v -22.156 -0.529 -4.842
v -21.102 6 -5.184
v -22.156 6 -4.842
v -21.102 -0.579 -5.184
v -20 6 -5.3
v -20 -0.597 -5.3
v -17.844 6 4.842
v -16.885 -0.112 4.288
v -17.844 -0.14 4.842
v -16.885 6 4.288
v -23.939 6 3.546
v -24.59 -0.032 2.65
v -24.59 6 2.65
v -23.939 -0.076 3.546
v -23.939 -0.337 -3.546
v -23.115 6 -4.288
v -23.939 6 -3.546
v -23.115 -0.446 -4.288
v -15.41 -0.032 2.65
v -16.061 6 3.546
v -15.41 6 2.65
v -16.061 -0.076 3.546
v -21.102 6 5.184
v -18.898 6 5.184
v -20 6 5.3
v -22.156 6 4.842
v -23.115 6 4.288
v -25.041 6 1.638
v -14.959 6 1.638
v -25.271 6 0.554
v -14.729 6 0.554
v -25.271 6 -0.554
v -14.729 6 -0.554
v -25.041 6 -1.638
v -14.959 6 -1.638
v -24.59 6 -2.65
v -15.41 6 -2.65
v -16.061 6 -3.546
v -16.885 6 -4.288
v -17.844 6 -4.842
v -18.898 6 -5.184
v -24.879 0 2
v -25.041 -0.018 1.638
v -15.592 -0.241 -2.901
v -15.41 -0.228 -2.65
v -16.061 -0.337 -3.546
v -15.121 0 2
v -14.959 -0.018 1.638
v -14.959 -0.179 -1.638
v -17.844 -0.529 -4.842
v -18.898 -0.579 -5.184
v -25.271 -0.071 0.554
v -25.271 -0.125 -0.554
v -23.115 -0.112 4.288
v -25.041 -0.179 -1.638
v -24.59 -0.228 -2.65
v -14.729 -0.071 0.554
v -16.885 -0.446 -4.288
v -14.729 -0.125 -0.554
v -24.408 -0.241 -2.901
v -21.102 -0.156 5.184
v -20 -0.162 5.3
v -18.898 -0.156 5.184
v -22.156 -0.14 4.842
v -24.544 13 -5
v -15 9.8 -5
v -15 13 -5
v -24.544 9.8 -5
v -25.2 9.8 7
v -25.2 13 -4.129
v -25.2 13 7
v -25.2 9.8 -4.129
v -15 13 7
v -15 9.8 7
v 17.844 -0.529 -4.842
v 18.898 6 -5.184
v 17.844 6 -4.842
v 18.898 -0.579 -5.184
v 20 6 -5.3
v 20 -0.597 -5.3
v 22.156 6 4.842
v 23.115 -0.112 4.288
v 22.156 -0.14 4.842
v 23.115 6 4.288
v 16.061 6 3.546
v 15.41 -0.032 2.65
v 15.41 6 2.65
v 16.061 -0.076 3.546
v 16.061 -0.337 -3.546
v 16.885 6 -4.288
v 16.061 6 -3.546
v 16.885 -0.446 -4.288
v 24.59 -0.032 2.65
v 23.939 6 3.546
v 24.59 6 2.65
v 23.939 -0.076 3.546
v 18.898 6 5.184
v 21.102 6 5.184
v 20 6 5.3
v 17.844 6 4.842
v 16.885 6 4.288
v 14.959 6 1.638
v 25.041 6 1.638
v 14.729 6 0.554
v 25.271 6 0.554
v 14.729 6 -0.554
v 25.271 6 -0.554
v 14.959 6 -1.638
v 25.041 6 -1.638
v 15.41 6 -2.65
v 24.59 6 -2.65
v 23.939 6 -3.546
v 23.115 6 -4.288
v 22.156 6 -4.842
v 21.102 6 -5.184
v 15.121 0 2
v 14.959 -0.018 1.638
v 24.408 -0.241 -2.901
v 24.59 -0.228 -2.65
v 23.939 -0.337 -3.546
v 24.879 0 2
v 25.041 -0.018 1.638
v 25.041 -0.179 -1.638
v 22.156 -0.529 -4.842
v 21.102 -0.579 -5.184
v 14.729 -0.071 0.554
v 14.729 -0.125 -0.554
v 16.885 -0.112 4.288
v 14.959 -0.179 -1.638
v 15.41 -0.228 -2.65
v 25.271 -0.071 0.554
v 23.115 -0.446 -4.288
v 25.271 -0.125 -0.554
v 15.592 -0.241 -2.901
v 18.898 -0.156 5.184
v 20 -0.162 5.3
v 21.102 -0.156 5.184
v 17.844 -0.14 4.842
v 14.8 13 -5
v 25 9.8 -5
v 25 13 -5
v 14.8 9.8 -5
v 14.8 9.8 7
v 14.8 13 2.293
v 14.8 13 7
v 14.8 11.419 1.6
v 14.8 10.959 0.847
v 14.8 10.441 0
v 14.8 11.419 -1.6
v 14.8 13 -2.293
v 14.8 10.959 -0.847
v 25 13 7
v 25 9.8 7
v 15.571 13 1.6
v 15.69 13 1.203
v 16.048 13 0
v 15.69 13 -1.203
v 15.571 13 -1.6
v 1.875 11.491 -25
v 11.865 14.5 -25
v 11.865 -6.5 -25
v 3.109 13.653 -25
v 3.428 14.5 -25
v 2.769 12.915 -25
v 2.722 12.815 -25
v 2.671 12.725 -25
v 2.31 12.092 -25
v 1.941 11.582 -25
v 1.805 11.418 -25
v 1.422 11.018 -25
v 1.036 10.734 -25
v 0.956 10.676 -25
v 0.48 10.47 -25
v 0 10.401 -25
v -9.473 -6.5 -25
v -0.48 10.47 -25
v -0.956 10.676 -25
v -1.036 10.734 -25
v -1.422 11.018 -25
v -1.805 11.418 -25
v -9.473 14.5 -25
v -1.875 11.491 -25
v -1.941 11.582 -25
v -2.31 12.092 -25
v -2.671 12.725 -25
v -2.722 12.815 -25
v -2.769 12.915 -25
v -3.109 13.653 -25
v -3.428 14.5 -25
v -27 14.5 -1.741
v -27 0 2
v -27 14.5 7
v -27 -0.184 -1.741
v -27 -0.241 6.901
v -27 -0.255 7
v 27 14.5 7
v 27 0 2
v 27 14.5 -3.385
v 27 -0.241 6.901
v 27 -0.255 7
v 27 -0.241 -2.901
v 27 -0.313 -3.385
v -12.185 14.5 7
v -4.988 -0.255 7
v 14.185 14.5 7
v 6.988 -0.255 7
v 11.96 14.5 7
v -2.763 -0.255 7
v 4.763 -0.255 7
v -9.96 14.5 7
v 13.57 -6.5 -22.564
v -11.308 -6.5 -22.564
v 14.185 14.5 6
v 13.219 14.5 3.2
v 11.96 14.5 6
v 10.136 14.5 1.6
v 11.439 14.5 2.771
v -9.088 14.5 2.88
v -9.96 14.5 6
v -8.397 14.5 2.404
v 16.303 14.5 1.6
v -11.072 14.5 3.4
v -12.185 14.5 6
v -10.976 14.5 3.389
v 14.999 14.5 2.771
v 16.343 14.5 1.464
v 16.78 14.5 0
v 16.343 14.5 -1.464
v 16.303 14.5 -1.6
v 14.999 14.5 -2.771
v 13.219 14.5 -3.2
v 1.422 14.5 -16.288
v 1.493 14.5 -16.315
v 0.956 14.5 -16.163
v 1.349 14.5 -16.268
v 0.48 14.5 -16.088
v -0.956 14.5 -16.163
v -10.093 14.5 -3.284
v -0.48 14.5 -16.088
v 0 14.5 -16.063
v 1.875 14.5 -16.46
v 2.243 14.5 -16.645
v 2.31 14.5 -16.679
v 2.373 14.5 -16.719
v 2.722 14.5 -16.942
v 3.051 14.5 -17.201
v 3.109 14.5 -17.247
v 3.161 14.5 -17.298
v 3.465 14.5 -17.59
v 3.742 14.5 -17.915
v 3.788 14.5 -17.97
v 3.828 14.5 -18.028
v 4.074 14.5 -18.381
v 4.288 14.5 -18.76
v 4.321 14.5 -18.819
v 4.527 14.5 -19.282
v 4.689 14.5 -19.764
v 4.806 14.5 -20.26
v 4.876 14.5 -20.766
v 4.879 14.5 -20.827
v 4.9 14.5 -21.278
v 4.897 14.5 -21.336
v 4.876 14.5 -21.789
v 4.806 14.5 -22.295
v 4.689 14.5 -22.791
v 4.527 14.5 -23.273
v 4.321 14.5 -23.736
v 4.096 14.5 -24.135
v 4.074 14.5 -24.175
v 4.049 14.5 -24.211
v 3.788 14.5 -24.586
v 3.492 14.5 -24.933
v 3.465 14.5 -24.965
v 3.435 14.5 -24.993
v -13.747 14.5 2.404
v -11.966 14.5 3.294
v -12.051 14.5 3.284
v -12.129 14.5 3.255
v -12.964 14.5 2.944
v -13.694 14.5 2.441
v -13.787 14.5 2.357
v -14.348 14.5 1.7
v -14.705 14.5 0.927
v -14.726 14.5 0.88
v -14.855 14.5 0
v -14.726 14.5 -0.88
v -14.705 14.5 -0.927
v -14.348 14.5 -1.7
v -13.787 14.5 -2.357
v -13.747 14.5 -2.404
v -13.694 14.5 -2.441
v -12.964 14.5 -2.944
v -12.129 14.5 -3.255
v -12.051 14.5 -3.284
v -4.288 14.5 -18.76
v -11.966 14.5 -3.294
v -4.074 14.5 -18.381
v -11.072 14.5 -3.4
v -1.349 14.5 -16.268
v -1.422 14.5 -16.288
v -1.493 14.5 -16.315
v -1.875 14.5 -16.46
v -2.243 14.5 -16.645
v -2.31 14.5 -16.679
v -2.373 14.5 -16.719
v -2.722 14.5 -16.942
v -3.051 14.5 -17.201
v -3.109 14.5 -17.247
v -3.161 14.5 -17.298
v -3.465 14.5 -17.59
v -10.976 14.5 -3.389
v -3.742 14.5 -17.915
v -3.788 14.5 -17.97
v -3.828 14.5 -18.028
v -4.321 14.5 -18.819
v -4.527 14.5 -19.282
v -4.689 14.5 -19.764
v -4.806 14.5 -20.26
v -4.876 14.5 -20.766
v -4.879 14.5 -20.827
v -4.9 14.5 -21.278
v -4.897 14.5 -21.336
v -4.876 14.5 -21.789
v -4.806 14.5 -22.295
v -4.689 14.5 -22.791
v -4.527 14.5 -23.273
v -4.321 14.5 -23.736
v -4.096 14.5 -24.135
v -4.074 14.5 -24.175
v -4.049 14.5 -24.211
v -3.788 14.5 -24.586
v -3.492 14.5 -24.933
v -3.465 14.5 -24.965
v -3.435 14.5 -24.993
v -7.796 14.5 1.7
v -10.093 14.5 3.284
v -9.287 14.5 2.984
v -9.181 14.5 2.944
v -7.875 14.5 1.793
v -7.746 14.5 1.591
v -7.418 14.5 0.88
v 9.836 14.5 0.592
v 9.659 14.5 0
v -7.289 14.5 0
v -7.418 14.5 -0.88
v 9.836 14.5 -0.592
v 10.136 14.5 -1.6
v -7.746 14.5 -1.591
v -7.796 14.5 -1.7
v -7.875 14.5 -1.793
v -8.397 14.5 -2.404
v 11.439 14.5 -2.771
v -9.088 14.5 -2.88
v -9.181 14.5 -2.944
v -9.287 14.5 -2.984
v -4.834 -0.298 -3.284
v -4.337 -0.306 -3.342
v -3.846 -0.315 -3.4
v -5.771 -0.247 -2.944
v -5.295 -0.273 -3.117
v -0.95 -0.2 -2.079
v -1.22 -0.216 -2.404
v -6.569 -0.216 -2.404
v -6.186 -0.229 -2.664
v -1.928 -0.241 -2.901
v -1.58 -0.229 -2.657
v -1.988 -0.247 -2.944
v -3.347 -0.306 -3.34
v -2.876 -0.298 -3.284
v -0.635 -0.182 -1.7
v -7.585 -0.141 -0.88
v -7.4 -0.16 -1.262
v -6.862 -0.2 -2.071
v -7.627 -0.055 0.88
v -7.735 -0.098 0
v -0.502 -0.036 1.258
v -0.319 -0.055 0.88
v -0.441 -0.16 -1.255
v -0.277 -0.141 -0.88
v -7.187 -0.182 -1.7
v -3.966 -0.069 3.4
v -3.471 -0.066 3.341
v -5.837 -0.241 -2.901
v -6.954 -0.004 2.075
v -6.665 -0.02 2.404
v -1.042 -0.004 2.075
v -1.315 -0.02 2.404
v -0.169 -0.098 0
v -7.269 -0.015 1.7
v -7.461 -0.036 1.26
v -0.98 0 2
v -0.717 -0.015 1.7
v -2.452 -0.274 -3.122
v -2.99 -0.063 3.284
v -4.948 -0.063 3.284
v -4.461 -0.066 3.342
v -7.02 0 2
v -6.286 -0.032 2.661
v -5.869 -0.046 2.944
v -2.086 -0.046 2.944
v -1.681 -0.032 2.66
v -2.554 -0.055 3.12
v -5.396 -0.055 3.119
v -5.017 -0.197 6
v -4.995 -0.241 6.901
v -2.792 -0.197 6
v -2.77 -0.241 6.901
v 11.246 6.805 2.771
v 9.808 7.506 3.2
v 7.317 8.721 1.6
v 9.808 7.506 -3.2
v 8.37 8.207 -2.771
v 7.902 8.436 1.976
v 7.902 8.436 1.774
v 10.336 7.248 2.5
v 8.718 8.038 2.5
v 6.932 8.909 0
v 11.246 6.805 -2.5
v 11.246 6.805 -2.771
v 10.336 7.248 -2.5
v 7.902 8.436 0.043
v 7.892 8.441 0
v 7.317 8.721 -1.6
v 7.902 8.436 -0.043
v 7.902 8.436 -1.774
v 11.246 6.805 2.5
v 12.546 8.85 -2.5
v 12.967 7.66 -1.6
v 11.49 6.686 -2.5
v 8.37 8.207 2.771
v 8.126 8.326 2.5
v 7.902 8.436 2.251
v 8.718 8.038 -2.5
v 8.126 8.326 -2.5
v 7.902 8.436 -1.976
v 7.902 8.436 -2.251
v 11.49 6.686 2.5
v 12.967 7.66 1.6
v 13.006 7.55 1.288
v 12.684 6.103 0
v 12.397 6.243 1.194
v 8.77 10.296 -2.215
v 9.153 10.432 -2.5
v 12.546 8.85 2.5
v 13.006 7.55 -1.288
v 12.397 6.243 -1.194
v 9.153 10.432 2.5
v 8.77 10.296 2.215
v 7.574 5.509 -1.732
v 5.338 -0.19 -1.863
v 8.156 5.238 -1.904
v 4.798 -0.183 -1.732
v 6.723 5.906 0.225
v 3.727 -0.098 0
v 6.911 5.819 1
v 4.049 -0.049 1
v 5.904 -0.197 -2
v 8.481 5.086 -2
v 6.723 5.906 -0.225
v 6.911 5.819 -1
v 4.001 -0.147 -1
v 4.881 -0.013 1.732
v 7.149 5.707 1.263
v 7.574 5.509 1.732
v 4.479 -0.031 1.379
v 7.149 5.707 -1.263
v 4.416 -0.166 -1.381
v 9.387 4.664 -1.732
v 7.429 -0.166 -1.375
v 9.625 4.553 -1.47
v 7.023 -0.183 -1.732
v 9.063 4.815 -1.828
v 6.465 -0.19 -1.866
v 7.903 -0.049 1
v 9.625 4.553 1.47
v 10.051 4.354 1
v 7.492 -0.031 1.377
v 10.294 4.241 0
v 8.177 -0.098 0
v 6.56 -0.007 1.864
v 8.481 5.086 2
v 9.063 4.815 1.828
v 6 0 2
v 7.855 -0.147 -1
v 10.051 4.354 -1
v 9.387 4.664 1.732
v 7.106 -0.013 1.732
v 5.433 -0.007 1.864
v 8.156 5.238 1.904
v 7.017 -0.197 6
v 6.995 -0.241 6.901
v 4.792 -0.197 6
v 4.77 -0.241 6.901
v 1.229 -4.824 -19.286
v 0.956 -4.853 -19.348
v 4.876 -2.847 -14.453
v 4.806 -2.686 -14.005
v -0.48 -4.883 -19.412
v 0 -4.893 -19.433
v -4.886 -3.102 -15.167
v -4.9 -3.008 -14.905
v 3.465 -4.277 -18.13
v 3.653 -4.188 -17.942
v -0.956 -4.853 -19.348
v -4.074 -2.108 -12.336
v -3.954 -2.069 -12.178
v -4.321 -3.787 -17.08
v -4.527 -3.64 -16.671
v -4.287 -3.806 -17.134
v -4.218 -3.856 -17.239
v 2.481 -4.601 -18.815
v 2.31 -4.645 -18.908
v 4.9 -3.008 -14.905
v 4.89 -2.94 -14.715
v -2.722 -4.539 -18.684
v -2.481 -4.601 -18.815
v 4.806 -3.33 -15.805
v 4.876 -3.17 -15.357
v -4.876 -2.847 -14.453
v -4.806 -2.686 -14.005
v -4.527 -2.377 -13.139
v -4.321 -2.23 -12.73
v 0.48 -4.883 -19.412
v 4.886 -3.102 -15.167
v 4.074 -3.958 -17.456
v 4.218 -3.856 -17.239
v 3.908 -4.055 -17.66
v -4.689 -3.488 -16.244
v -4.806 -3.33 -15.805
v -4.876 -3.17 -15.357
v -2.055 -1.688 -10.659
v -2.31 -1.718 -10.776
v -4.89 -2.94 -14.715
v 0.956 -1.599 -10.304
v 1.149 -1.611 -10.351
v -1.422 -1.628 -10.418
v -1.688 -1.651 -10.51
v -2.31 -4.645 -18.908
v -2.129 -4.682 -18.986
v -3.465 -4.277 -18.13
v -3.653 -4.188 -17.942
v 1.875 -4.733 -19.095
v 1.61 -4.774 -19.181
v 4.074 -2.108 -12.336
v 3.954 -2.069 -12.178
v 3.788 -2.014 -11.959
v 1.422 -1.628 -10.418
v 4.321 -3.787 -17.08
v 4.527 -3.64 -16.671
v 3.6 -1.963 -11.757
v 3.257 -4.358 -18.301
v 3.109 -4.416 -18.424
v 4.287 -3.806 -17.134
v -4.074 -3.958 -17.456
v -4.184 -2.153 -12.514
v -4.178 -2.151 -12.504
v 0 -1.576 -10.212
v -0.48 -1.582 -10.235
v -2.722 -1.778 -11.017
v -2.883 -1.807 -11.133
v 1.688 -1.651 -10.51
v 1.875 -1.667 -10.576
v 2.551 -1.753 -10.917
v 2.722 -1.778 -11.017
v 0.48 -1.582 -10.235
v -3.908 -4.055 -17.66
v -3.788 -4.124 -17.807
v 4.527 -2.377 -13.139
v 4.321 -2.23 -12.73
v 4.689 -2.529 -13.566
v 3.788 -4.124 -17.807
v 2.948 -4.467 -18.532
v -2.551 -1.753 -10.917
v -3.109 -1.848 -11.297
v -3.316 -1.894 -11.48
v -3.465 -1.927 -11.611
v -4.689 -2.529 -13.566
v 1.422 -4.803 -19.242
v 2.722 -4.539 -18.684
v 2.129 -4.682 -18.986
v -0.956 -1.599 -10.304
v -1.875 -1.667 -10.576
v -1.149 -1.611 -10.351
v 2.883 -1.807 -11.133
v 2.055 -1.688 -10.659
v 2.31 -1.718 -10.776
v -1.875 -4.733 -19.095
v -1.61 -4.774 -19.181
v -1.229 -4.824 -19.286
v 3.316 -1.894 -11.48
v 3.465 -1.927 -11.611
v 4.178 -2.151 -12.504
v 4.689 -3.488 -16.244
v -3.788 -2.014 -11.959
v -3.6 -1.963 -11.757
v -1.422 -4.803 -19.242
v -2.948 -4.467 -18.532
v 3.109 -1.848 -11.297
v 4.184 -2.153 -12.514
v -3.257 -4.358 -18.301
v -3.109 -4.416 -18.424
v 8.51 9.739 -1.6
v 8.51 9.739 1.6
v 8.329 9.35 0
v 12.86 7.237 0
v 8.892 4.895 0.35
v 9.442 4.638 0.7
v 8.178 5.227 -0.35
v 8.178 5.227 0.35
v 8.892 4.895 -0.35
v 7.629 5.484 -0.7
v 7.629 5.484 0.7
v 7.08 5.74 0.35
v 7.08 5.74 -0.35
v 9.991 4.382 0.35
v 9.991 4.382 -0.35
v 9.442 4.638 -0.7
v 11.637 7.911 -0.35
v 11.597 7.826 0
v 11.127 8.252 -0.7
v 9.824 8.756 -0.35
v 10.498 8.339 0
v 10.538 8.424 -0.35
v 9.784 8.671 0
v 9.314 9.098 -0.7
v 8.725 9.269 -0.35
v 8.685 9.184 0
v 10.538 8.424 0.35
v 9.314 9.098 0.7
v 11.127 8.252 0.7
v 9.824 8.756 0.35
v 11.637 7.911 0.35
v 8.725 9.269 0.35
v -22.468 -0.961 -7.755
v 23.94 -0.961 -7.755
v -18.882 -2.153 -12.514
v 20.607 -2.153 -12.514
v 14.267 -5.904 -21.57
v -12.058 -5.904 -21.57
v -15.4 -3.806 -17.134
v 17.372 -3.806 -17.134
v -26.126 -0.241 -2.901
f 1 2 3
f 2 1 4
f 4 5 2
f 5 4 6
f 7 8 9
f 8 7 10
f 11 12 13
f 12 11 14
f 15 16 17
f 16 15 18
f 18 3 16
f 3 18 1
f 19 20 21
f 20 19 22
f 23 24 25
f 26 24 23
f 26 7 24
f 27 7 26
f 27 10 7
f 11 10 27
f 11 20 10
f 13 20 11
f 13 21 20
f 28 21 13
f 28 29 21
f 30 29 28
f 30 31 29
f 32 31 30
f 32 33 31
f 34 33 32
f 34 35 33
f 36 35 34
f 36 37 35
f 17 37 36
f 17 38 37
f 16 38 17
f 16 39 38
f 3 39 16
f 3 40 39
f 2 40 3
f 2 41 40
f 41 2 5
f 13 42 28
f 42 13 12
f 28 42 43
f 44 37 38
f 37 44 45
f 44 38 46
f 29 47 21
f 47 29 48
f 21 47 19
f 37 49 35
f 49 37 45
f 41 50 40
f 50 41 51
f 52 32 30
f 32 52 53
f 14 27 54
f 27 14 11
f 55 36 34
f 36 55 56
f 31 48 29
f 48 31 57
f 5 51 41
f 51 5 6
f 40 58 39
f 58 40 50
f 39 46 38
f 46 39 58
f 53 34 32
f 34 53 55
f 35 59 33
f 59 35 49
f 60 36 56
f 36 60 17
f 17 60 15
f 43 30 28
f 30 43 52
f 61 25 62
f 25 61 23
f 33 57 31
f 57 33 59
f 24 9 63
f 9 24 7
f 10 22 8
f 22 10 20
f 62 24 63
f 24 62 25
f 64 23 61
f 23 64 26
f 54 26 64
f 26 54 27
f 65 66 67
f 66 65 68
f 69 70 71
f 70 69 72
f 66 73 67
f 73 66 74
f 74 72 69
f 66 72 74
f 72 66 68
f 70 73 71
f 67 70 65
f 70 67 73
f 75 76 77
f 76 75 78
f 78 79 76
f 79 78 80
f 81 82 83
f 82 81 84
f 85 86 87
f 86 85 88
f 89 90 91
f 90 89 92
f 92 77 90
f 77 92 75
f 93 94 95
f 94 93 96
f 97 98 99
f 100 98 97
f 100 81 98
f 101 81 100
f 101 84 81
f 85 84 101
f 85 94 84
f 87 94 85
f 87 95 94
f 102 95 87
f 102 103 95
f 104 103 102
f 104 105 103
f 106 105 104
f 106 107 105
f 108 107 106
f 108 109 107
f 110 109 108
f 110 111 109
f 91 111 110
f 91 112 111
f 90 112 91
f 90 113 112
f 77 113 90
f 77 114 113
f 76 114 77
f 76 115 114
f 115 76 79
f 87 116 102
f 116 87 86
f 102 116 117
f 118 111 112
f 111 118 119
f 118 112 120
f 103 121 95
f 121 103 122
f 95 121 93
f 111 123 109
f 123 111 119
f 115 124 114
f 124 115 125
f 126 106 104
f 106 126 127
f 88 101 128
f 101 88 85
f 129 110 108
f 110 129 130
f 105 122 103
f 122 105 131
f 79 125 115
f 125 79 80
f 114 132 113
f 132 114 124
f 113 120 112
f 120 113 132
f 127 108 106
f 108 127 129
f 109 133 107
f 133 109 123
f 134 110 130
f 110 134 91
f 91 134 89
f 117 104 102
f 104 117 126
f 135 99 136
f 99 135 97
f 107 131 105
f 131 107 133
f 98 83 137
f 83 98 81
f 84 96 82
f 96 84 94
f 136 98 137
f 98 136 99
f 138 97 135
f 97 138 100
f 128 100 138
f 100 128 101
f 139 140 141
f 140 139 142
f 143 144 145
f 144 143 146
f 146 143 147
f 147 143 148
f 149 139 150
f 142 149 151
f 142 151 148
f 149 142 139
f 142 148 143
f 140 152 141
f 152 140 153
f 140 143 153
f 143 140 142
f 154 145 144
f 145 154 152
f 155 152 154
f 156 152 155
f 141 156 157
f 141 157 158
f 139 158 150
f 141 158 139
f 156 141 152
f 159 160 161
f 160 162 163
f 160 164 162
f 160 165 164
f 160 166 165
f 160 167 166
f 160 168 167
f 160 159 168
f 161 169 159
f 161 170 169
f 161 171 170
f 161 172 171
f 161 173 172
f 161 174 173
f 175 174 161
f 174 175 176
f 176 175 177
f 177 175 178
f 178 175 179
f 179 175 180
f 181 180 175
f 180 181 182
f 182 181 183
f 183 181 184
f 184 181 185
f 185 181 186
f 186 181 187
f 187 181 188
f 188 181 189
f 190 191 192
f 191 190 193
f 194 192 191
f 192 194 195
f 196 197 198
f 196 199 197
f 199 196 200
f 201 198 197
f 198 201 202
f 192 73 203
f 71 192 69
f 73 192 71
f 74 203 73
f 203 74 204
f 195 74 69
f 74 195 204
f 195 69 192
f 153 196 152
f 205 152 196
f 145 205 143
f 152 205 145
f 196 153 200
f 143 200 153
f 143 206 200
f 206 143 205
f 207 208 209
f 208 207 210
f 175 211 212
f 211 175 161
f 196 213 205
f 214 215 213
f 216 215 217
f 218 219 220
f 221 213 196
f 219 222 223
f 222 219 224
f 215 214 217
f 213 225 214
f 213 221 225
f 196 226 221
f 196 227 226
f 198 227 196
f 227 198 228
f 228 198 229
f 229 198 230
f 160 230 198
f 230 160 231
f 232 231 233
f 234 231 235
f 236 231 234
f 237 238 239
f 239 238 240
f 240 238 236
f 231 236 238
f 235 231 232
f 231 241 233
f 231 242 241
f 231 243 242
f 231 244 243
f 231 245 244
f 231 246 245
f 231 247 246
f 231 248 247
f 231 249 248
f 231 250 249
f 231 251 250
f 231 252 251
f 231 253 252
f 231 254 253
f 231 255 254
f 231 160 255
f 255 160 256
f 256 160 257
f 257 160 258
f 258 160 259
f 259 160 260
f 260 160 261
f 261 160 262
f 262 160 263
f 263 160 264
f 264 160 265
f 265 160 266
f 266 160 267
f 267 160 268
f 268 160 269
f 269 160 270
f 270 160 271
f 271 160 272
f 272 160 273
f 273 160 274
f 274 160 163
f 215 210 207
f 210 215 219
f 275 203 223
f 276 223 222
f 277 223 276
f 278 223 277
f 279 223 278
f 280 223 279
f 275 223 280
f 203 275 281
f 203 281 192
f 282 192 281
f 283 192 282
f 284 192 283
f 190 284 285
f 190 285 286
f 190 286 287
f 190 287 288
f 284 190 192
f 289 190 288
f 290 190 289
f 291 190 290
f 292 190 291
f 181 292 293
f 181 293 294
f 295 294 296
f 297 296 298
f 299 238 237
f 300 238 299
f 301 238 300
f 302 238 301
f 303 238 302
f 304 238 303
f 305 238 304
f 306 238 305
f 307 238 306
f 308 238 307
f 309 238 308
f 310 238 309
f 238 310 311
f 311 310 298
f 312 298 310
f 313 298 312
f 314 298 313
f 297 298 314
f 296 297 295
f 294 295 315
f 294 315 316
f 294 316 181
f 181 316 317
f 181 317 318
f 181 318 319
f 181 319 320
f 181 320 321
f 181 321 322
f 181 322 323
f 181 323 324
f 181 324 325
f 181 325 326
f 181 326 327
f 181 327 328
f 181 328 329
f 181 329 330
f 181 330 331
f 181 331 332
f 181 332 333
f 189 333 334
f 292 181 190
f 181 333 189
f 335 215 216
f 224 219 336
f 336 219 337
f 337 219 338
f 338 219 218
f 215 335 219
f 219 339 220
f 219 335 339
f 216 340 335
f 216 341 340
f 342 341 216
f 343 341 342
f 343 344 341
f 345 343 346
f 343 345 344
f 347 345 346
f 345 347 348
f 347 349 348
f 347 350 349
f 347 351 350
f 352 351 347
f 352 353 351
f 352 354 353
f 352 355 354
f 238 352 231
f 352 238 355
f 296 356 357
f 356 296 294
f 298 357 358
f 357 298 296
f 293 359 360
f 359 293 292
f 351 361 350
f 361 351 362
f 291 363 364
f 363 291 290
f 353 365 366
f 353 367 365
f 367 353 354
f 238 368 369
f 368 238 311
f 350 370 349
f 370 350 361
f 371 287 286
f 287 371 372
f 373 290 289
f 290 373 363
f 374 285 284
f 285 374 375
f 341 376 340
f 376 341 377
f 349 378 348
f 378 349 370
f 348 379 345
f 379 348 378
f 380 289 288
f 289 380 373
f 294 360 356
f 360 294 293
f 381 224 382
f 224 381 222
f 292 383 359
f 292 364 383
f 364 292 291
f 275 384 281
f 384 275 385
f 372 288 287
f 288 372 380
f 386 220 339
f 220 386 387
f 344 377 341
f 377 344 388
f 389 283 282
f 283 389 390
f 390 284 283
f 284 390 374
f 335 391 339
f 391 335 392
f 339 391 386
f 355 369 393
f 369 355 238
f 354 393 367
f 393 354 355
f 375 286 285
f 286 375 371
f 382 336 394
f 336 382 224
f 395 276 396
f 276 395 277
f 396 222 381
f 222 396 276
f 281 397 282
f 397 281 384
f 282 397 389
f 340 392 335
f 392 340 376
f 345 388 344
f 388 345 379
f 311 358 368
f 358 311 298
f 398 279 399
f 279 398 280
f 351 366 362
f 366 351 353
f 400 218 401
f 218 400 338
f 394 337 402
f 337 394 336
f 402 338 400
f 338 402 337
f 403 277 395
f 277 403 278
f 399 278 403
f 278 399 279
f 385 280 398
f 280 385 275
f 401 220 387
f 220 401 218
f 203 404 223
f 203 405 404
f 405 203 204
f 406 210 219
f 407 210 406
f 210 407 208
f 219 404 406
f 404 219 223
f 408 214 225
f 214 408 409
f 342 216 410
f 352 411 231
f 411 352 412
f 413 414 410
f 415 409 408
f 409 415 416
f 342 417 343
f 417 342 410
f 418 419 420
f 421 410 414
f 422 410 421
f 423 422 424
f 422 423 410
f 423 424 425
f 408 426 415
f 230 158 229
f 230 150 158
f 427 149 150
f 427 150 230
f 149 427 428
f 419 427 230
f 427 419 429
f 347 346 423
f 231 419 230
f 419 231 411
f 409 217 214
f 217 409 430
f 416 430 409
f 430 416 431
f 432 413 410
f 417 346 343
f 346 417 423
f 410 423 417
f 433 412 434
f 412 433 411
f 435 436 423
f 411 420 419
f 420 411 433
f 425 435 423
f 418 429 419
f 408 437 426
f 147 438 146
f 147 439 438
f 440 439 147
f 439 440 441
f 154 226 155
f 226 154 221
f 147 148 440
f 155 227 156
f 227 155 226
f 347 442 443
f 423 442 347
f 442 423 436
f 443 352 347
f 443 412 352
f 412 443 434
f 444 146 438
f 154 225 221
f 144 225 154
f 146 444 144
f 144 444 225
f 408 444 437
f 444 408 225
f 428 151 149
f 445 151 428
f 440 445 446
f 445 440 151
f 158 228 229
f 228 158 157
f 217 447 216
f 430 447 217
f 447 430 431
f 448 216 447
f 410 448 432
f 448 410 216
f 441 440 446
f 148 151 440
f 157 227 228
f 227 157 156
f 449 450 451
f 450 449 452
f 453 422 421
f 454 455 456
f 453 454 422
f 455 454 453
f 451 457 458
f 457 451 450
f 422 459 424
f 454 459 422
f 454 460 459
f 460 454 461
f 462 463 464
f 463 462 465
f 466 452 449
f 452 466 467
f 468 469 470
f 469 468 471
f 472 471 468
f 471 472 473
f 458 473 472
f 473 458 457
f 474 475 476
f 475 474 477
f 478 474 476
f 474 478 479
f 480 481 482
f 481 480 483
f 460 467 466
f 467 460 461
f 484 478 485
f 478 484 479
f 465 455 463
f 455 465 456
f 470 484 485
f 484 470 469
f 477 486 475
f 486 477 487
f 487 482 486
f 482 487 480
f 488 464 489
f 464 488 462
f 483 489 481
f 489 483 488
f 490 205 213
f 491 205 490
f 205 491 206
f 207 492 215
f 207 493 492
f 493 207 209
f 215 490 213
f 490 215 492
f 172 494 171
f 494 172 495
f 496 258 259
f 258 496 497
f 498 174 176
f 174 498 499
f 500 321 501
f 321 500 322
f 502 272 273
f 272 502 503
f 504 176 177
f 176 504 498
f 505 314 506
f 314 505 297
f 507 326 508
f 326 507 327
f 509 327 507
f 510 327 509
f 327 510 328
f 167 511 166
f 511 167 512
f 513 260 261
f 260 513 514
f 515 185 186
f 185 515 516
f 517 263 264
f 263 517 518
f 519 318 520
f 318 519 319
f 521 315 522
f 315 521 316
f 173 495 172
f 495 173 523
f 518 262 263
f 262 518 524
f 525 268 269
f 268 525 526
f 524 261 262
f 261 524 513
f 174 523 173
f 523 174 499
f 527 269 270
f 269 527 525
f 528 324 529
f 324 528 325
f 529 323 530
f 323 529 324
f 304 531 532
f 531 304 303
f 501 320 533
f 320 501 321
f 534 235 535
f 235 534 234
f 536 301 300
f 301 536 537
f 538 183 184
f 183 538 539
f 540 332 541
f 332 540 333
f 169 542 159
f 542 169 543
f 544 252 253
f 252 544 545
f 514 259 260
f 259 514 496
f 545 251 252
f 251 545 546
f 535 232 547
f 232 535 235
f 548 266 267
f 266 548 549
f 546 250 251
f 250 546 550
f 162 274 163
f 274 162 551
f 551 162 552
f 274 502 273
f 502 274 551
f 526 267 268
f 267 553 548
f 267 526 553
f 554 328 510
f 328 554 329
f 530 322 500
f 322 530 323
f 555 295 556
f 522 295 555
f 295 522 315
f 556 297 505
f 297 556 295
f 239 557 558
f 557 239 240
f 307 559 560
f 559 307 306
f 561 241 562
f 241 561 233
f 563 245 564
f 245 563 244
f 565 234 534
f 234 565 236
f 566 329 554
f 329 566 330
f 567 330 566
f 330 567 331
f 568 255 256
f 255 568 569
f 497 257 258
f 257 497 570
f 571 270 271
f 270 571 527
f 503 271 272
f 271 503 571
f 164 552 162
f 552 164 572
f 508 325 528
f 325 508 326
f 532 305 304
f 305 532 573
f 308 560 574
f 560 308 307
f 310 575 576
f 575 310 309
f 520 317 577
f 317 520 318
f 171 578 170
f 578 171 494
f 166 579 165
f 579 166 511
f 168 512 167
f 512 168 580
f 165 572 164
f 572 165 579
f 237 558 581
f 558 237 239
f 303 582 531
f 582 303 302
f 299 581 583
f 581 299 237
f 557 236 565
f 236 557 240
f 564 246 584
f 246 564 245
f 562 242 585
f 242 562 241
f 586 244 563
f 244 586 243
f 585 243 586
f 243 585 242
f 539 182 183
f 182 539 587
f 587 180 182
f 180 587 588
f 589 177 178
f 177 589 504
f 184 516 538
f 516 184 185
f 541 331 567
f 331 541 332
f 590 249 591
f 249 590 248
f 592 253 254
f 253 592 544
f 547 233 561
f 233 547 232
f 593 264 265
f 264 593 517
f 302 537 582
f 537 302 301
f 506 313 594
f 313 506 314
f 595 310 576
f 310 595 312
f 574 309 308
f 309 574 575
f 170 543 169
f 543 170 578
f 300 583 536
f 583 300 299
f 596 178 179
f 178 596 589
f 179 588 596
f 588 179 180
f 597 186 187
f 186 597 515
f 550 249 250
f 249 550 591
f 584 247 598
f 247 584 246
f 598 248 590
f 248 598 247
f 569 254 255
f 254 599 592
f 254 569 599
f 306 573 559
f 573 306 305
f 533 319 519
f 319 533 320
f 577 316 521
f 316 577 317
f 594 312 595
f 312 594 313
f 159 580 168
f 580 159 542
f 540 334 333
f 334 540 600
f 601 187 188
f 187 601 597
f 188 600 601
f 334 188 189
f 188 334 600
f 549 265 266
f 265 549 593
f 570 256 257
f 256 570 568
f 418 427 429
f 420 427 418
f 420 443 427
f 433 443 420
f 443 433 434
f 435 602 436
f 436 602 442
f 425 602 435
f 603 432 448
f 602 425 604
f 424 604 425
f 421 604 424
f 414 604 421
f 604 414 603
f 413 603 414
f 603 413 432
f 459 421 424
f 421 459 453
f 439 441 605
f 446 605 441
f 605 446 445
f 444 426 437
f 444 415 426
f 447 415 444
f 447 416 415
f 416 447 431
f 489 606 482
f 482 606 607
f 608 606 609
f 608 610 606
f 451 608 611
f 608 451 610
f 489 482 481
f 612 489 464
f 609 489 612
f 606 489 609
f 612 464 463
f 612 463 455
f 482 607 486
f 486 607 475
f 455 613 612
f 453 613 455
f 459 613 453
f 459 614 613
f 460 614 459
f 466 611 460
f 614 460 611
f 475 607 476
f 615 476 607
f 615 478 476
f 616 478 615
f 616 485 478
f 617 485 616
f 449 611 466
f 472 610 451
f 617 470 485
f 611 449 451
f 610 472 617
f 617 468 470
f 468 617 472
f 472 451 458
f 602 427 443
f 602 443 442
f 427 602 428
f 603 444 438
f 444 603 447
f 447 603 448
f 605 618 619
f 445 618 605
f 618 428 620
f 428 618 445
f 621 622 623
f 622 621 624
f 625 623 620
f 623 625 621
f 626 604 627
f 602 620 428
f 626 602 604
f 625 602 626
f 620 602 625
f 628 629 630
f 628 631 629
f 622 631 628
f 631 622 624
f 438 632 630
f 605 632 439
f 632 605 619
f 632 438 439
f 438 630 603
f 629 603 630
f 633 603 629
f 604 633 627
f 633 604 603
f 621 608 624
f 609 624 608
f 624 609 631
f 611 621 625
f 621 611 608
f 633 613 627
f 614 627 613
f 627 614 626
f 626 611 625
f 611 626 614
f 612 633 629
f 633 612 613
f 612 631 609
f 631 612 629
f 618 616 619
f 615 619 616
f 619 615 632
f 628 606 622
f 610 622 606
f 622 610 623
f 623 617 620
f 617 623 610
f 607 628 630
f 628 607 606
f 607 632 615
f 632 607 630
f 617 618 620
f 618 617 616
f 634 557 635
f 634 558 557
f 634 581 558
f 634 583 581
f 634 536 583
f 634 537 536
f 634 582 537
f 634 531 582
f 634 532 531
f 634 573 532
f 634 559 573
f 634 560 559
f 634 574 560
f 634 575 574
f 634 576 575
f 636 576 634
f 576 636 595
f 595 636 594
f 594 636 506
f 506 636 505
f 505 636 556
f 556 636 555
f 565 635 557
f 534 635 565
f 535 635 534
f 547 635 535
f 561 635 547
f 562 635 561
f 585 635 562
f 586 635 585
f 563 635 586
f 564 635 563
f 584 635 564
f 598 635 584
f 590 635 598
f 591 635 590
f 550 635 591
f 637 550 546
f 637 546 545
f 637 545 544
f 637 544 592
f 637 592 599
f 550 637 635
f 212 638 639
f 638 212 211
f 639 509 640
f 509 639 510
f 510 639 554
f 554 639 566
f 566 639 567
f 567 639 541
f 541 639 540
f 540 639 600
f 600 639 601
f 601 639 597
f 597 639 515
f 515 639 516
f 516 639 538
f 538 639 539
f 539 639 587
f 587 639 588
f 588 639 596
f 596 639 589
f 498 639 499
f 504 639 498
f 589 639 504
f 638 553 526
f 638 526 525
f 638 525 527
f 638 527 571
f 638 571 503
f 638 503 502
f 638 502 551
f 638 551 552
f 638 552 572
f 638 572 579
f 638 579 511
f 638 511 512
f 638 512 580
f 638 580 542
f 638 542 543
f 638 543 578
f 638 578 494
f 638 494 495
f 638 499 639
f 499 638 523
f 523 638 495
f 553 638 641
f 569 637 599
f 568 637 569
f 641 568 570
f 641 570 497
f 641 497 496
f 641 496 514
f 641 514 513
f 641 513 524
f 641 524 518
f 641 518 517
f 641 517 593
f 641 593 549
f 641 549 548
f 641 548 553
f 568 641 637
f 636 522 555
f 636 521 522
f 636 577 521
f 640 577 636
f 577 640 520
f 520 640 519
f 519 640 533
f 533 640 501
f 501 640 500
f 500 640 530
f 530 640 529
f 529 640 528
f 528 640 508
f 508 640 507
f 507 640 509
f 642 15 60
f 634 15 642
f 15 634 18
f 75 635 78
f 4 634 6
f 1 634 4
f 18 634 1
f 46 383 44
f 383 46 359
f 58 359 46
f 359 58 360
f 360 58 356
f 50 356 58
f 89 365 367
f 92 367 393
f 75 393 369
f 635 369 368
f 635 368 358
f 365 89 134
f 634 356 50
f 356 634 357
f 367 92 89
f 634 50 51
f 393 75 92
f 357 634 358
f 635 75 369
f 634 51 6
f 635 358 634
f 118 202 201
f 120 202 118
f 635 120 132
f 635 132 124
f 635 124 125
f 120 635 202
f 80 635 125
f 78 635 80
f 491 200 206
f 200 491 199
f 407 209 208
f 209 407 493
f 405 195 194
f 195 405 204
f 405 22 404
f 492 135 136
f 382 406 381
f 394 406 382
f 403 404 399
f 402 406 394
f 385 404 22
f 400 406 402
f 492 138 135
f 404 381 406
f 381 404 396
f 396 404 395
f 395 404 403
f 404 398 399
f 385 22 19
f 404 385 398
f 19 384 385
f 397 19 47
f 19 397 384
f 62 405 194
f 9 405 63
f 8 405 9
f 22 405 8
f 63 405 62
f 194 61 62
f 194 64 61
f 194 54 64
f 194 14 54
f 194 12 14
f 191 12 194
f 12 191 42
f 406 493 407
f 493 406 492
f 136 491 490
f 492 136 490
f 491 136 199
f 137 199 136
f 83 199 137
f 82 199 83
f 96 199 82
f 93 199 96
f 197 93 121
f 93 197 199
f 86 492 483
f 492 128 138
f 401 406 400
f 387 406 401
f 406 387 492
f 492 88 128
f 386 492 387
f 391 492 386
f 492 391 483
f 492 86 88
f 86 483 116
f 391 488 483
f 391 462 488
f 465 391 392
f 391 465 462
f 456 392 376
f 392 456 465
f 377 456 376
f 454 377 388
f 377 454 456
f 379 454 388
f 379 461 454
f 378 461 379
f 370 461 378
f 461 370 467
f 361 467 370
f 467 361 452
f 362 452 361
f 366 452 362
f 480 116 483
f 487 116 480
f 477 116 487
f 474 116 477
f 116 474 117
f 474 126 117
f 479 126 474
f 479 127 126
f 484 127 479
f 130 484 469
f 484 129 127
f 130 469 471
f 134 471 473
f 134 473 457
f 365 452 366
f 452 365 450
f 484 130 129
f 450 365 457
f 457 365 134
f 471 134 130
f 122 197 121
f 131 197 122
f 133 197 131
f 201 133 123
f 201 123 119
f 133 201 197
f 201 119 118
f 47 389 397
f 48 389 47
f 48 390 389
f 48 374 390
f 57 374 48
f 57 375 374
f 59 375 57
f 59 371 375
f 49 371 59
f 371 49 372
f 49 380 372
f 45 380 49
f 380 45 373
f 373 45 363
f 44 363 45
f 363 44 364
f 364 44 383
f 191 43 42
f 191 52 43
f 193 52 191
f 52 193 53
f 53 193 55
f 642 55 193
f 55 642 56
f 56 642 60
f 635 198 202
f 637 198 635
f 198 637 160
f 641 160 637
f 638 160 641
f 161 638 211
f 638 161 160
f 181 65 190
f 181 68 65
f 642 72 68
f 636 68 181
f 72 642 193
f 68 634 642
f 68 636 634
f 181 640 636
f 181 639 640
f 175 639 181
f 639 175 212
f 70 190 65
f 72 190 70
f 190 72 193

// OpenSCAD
diameter=10;
height=4;
number=3;
distance=5;
baseline=36; 


module maghole(diameter,height,number,back) {
		translate([0,height*(number-2)/2,0])
        rotate([90,0,0])
         cylinder(r=diameter/2,h=height*(2*number-1),center=true);
    if(back == 1) {
		translate([0,-height*2*(number+1)/2,0])
        rotate([90,0,0])
         cylinder(r=diameter/6,h=height*number,center=true);
    }
}

module smaghole(diameter,height,number,back) {
		translate([0,(height*(number-2)/2),0])
        rotate([90,0,0])
         cylinder(r=0.3+diameter/2,h=height*4,center=true,$fs = 0.01);
//         cylinder(r=0.3+diameter/2,h=height*(2*number-1),center=true);

    translate([-9,-13,-5]) cube([4+diameter,3.2,diameter+0.2]);    
   // translate([-1,-15,0]) cube([3,3,10]);
}
module mirror(diameter,height,number,distance,baseline) {
width=diameter+4;
depth=distance+height*number+4;
length=baseline+diameter+8;
mirrorthick = 2.7;
   difference() {
     translate([0,-height,0])
	   cube([width,  // Small dimension
            depth, // Optical path dim
		      length],center=true);
      translate([0,0,2+baseline/2])
             maghole(diameter,height,number,0);
     translate([0,0,-(2+baseline/2)])
             maghole(diameter,height,number,0);
     translate([0,depth/4,0])
          cube([width+2,depth+2,length-2*width],center=true);
    rotate([7,0,0])
     translate([0,0.6-depth/3,0.75])
          cube([width+2,mirrorthick+0.6,length-(2*diameter+4)],center=true);
     }
}

module sensor(diameter,height,number,distance,baseline) {
width=diameter+4;
depth=distance+height*number+4;
length=baseline+diameter+8;
mirrorthick = 2.6;
extra=2*width+4;

   difference() {
     translate([2+width/2,-height,0])
	   cube([extra,  // Small dimension
            depth, // Optical path dim
		      length],center=true);
      translate([0,0,2+baseline/2])
             smaghole(diameter,height,number,1);
     translate([0,0,-(2+baseline/2)])
             smaghole(diameter,height,number,1);
//LASER
     translate([0,0,4])
        rotate([64,0,0])
             cylinder(r=3.4,h=40,center=true,$fn=24);
     translate([-11,0,4])
        rotate([64,0,0]) cube([10,2,40],center=true);
//PhotoTransistor
     translate([0,-12,-12])
        rotate([116,0,0])
             cylinder(r=3.2,h=10,center=true,$fn=12);
     translate([0,0,-6])
        rotate([116,0,0])
             cylinder(r=2,h=40,center=true,$fn=12);
     translate([-11,0,-6])
        rotate([116,0,0]) cube([10,2,40],center=true);
//TEMP SENSOR
     translate([2+width,0,0])
        rotate([90,0,20])
             cylinder(r=4.9,h=40,center=true,$fn=64);

     }
translate([0,-5,-6.3])
rotate([25,0,0])
     difference() {
     translate([0,-4,-2.5])cube([5,6,5],center=true);
     translate([0,-8,0])
        cylinder(r=3.2,h=10,center=true,$fn=12);
     translate([0,0,-1.0])
        rotate([90,0,0])
             cylinder(r=0.7,h=40,center=true,$fn=6);
     translate([0,0,-3])
        rotate([90,0,0])
             cylinder(r=0.7,h=40,center=true,$fn=6);
     }
}

module jarwall() {
  difference() {
     cube([40,40,120],center=true);
	  translate([40,0,0])
	     cylinder(r=50,h=120,center=true,$fn=64);
	   }
}

module jar() {
	  translate([-8,110,-10])
	          cylinder(r=50,h=120,center=true,$fn=64);
}

module powerhole(dim) {
offset = dim+2;
  //  cylinder(r=dim,h=2*dim,center=true,$fn=10);
  //  translate([dim-1.6,0,0])
   //   cylinder(r=dim,h=dim,center=true,$fn=10);
    translate([dim-3,0,0]) cube([2*dim+2,2*dim-1,2*dim-1],center=true);
    translate([-offset,0,0])
      cylinder(r=1.1,h=2*dim,center=true,$fn=10);
    translate([offset+2,0,0])
      cylinder(r=1.1,h=2*dim,center=true,$fn=10);
}

module sensordevice() {
  wall = 32;
  side = 44;
  deep = 50;
  difference() { 
   sensor(diameter,height,number,distance,baseline);
   translate([6,-60,3]) jar();
  }
//  translate([-7,-(wall+30),21]) cube([wall,side+12,3]);

//     translate([-7,-(wall+30),-24])
//         cube([wall,side+12,3]);

//  difference() {
//  translate([23.5,-(wall+7),0])
//    rotate([0,90,0])
//    cube([side,deep,3],center=true);
//     translate([24,-54,12])
//			rotate([0,90,0]) 
//           powerhole(4.5);
//  }
}
module mirrordevice() {
  difference() { 
   mirror(diameter,height,number,distance,baseline);
   translate([0,-3.3,0]) rotate([0,0,-90]) jarwall();
  }
}
  // mirrordevice();

module minimum() {
 difference() {
    rotate([0,90,180]) 
           sensordevice();
   translate([34,0,-30])
     rotate([0,35,0])
      cube([42,42,42],center=true);
   translate([-32,0,-30])
     rotate([0,-37,0])
      cube([42,42,42],center=true);
  }
}

minimum();



     
